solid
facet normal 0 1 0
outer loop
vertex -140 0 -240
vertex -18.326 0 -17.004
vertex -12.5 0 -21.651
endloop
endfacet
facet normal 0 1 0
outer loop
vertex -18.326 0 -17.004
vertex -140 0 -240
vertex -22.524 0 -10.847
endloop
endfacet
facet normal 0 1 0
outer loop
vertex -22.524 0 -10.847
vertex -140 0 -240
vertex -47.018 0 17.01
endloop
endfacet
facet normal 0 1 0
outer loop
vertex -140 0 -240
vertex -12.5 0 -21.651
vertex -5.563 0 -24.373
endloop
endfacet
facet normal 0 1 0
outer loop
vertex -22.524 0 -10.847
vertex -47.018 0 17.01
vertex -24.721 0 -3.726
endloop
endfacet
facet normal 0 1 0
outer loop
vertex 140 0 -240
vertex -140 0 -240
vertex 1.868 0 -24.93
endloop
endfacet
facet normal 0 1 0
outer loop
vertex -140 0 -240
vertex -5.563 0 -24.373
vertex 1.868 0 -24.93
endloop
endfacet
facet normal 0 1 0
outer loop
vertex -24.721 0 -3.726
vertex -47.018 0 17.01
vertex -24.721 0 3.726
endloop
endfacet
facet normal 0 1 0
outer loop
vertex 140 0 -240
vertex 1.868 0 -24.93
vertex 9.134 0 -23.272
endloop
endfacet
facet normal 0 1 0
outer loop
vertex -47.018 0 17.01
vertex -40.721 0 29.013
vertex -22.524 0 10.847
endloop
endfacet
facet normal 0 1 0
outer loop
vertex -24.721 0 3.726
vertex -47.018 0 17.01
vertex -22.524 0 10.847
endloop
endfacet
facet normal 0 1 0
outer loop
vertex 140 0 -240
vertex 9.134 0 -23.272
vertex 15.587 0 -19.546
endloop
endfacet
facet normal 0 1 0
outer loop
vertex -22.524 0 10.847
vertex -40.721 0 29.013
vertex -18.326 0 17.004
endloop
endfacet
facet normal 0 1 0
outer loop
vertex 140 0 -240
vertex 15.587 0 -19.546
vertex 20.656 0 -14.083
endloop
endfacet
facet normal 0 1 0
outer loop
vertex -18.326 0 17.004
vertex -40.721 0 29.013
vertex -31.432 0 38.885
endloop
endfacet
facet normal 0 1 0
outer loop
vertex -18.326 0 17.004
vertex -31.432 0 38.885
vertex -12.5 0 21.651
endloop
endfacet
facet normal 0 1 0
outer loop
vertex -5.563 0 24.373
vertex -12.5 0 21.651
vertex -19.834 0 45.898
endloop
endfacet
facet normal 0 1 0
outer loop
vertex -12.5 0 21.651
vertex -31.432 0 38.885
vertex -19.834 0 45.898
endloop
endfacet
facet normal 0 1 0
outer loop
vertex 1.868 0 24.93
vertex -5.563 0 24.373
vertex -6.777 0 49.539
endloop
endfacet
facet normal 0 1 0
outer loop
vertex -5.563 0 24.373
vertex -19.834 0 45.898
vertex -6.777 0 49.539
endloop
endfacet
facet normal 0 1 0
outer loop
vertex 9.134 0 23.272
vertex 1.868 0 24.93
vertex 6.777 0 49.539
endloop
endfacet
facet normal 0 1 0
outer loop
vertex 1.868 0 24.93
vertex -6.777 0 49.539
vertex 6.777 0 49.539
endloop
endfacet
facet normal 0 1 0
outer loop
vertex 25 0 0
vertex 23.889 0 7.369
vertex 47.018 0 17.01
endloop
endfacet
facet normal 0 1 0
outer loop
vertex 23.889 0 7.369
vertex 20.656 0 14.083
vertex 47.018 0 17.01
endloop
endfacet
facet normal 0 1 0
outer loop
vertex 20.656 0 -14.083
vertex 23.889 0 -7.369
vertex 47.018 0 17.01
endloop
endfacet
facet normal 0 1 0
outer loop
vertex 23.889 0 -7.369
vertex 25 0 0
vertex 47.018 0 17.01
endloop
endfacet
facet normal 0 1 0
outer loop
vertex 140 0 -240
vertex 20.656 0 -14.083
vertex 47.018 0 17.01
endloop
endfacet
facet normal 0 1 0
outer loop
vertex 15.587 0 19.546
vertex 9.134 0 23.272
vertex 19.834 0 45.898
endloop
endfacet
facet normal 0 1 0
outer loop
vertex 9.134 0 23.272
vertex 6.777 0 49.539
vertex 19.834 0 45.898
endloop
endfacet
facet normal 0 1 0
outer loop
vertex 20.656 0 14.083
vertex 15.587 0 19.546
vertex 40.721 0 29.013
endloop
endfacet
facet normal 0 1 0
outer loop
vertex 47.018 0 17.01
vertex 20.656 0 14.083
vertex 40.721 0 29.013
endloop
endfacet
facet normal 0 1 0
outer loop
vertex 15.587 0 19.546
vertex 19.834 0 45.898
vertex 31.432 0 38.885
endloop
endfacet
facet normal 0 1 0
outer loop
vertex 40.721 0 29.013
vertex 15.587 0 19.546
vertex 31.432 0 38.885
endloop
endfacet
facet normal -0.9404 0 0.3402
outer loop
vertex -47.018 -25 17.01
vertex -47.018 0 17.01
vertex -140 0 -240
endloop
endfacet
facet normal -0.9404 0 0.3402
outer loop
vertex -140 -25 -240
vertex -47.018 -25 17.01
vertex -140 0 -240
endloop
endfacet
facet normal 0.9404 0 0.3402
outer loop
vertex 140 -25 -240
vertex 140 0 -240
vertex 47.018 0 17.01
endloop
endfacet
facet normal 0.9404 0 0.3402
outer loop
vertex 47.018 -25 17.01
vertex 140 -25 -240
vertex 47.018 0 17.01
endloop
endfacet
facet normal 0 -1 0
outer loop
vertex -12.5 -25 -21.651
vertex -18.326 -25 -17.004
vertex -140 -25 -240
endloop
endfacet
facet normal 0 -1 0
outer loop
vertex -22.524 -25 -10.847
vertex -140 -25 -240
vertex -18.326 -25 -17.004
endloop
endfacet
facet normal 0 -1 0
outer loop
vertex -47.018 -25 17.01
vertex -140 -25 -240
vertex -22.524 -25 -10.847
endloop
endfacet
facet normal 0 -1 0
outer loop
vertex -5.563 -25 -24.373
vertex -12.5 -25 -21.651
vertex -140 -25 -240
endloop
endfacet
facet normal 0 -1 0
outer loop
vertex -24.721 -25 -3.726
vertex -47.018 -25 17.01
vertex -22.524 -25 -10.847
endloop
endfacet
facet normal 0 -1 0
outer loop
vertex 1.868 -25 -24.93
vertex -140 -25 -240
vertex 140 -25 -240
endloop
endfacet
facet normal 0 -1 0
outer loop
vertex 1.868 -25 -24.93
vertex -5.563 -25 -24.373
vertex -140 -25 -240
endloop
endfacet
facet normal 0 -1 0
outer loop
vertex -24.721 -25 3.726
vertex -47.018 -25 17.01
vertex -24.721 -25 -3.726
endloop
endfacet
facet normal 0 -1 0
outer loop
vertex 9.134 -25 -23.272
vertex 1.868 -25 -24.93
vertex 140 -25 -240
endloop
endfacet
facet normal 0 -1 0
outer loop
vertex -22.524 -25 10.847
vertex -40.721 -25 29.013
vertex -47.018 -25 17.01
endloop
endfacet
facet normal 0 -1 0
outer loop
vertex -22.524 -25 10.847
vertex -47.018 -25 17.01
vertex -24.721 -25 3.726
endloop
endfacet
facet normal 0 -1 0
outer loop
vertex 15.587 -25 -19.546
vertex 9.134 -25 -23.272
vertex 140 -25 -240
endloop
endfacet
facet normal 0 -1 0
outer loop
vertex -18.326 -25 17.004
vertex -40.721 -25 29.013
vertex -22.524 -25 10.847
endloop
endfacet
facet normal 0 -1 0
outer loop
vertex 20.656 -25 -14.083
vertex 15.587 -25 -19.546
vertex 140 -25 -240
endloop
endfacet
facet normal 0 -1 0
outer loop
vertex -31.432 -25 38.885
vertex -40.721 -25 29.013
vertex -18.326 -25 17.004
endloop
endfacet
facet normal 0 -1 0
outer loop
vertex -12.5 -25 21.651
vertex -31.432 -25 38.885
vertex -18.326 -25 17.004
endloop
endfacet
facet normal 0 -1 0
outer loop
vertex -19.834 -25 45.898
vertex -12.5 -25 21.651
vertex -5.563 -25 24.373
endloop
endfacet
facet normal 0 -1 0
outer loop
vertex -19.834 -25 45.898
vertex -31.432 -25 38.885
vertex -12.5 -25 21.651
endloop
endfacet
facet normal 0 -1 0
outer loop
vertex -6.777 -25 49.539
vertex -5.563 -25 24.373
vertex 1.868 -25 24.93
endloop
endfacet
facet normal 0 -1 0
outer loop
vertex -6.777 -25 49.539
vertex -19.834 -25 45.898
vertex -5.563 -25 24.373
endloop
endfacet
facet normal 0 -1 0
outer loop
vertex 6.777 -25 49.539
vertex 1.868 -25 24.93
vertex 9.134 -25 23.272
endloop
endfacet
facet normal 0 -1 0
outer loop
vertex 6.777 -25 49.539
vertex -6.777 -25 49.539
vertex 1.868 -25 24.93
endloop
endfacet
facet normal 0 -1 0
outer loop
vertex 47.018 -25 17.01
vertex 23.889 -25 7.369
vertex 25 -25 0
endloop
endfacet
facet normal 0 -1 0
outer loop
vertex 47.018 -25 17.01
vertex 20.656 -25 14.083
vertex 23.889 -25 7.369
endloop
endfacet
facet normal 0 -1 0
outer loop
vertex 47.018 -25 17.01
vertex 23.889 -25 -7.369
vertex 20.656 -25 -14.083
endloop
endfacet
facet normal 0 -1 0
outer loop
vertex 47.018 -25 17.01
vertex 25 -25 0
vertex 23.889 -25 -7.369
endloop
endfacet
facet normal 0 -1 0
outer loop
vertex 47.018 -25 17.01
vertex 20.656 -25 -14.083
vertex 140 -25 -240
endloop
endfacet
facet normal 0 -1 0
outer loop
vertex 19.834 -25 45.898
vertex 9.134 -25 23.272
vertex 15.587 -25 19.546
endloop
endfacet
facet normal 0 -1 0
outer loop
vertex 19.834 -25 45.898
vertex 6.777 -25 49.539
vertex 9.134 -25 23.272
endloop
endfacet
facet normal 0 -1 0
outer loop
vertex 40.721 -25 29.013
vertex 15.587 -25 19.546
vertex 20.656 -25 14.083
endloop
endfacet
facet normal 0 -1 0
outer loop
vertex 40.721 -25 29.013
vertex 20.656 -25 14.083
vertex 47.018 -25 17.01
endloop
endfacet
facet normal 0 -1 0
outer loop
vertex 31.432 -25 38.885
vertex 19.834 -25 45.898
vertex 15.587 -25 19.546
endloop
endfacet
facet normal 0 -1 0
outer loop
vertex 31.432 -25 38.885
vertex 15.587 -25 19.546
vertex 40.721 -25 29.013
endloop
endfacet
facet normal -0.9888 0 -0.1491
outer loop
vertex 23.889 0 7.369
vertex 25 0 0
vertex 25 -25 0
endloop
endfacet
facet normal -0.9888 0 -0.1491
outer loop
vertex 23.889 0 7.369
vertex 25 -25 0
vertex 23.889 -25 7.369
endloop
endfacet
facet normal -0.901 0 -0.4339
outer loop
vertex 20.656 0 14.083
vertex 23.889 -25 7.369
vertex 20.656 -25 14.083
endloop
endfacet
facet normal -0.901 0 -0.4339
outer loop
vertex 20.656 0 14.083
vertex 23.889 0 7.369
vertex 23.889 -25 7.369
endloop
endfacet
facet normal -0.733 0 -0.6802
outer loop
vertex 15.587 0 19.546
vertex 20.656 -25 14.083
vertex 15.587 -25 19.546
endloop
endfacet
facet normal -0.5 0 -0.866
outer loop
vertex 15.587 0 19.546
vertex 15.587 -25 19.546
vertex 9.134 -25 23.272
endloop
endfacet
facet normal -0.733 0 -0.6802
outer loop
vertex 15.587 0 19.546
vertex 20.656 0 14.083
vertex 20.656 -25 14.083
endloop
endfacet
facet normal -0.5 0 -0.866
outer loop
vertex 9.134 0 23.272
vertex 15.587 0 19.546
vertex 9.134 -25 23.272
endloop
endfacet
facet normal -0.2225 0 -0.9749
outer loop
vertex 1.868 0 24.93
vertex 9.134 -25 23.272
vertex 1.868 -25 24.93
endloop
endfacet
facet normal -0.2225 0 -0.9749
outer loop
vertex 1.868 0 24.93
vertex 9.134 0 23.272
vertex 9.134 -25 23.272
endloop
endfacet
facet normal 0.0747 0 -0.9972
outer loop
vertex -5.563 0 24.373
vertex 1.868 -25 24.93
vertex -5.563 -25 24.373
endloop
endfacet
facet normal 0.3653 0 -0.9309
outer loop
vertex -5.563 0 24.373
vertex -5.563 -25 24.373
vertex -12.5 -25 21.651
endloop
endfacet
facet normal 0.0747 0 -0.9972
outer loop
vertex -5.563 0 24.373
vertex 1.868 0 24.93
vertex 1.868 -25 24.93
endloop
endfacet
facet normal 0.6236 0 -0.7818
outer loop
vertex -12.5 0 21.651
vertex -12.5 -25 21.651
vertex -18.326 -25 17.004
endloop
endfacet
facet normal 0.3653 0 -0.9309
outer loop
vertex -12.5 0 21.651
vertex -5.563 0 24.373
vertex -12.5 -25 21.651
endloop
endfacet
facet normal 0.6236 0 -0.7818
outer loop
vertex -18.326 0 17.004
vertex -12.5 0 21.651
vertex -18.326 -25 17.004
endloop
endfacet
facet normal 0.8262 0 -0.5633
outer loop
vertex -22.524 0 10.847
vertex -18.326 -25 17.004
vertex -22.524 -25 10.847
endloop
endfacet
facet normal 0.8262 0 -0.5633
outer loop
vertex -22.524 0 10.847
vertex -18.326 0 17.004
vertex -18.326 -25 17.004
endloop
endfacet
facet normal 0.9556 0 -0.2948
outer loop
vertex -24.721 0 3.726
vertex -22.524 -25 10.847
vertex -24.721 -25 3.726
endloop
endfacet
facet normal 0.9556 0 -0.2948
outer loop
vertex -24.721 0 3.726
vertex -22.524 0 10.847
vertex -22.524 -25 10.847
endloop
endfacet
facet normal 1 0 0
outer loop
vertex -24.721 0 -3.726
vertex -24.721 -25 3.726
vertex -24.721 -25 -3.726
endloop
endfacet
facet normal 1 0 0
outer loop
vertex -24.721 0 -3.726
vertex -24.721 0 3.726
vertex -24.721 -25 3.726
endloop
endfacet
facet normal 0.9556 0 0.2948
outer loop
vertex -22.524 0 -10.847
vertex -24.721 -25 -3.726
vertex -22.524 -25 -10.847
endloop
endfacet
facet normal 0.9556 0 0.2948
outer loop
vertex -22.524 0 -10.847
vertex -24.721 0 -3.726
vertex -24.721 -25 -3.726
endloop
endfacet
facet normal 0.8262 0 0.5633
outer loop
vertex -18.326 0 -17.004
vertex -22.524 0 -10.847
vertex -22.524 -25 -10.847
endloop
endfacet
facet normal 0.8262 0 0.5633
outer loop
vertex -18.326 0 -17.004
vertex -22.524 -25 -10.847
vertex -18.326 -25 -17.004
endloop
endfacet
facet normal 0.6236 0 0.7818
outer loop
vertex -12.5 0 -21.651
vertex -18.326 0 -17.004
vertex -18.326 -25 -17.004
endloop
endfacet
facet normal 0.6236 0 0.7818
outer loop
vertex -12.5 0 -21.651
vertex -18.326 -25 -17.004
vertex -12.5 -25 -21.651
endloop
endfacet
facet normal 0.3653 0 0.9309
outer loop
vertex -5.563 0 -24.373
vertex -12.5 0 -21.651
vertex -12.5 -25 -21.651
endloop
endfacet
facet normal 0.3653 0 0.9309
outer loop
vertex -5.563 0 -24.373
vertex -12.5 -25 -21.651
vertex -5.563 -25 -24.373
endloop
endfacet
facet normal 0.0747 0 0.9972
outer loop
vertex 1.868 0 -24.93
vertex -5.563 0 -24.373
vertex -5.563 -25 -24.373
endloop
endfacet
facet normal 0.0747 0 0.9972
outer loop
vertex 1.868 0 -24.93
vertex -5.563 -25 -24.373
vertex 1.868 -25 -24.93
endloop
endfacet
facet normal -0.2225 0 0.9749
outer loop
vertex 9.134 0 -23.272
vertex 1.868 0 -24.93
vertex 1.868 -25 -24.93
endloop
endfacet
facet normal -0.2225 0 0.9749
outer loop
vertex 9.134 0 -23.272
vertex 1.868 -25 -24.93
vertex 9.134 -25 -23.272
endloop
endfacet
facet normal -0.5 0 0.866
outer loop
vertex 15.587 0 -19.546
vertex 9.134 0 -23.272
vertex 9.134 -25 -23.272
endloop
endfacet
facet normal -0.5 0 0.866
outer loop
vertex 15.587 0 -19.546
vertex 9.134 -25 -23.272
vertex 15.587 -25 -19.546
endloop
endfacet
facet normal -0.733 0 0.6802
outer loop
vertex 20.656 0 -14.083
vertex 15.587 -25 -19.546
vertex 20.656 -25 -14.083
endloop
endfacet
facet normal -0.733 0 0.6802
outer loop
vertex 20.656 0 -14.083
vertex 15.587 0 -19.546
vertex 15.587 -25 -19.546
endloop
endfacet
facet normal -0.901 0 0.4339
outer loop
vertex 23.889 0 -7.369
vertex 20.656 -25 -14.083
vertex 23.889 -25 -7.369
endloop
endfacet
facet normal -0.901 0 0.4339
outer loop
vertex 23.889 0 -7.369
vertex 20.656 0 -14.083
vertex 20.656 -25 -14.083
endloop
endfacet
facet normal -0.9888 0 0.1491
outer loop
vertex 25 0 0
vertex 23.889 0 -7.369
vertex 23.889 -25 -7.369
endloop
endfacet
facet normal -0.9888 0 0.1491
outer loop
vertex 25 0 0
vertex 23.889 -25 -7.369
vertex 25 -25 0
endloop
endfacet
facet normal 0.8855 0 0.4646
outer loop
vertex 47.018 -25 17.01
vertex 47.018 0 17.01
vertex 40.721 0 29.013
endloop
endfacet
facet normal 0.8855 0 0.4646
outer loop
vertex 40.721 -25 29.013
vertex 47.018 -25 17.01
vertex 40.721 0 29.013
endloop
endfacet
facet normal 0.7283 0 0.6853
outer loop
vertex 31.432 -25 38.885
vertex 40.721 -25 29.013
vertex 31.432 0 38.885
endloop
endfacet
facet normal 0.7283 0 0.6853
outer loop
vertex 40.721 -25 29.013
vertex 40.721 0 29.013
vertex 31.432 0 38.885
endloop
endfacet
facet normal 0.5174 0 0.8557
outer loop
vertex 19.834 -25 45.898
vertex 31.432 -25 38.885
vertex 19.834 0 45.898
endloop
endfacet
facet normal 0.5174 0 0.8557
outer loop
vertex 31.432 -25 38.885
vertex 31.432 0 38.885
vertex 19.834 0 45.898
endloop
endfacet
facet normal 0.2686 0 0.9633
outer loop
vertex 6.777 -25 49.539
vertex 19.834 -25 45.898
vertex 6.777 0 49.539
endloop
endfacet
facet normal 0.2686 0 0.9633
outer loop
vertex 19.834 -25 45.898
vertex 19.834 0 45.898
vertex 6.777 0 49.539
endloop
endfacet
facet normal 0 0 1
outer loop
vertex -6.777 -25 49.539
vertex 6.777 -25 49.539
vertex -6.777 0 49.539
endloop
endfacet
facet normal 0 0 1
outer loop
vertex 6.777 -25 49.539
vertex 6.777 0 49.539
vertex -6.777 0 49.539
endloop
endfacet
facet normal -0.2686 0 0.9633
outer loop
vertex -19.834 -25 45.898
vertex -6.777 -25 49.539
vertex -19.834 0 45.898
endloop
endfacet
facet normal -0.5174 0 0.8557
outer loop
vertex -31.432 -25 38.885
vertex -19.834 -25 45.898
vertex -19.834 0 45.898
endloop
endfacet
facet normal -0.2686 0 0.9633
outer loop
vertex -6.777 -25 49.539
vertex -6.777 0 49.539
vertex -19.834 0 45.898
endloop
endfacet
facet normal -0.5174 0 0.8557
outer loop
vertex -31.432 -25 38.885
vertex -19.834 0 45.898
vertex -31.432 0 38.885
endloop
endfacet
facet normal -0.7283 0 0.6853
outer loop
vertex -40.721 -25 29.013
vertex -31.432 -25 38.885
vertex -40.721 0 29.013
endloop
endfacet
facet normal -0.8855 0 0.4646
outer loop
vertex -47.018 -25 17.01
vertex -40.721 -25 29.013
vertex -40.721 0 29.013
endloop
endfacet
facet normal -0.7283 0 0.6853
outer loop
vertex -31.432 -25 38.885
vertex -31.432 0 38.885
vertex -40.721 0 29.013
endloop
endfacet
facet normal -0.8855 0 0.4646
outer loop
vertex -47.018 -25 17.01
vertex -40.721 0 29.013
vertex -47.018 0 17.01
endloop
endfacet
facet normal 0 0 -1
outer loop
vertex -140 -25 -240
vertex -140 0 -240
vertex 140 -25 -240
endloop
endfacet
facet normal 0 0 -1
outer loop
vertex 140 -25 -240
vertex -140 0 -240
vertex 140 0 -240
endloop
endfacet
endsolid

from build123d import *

# Parameters (mm, degrees)
F0_R     = 25
F1_DEPTH = 25


with BuildPart() as f1:
    # F0 (on Front) → F1 (new body)
    with BuildSketch(Plane.XZ):
        with BuildLine():
            ThreePointArc((47.017566, 17.010247), (49.248748, 8.634863), (50, 0))
            ThreePointArc((50, 0), (-8.634862, -49.248748), (-47.017566, 17.010246))
            Line((-47.017566, 17.010246), (-140, -240))
            Line((-140, -240), (0, -240))
            Line((0, -240), (140, -240))
            Line((140, -240), (47.017566, 17.010247))
        make_face()
        with BuildLine():
            ThreePointArc((-47.017566, 17.010246), (-8.634862, -49.248748), (50, 0))
            ThreePointArc((50, 0), (49.248748, 8.634863), (47.017566, 17.010247))
            ThreePointArc((47.017566, 17.010247), (-1e-06, 50), (-47.017566, 17.010246))
        make_face()
        Circle(F0_R, mode=Mode.SUBTRACT)
    extrude(amount=F1_DEPTH)


solid = f1.part
